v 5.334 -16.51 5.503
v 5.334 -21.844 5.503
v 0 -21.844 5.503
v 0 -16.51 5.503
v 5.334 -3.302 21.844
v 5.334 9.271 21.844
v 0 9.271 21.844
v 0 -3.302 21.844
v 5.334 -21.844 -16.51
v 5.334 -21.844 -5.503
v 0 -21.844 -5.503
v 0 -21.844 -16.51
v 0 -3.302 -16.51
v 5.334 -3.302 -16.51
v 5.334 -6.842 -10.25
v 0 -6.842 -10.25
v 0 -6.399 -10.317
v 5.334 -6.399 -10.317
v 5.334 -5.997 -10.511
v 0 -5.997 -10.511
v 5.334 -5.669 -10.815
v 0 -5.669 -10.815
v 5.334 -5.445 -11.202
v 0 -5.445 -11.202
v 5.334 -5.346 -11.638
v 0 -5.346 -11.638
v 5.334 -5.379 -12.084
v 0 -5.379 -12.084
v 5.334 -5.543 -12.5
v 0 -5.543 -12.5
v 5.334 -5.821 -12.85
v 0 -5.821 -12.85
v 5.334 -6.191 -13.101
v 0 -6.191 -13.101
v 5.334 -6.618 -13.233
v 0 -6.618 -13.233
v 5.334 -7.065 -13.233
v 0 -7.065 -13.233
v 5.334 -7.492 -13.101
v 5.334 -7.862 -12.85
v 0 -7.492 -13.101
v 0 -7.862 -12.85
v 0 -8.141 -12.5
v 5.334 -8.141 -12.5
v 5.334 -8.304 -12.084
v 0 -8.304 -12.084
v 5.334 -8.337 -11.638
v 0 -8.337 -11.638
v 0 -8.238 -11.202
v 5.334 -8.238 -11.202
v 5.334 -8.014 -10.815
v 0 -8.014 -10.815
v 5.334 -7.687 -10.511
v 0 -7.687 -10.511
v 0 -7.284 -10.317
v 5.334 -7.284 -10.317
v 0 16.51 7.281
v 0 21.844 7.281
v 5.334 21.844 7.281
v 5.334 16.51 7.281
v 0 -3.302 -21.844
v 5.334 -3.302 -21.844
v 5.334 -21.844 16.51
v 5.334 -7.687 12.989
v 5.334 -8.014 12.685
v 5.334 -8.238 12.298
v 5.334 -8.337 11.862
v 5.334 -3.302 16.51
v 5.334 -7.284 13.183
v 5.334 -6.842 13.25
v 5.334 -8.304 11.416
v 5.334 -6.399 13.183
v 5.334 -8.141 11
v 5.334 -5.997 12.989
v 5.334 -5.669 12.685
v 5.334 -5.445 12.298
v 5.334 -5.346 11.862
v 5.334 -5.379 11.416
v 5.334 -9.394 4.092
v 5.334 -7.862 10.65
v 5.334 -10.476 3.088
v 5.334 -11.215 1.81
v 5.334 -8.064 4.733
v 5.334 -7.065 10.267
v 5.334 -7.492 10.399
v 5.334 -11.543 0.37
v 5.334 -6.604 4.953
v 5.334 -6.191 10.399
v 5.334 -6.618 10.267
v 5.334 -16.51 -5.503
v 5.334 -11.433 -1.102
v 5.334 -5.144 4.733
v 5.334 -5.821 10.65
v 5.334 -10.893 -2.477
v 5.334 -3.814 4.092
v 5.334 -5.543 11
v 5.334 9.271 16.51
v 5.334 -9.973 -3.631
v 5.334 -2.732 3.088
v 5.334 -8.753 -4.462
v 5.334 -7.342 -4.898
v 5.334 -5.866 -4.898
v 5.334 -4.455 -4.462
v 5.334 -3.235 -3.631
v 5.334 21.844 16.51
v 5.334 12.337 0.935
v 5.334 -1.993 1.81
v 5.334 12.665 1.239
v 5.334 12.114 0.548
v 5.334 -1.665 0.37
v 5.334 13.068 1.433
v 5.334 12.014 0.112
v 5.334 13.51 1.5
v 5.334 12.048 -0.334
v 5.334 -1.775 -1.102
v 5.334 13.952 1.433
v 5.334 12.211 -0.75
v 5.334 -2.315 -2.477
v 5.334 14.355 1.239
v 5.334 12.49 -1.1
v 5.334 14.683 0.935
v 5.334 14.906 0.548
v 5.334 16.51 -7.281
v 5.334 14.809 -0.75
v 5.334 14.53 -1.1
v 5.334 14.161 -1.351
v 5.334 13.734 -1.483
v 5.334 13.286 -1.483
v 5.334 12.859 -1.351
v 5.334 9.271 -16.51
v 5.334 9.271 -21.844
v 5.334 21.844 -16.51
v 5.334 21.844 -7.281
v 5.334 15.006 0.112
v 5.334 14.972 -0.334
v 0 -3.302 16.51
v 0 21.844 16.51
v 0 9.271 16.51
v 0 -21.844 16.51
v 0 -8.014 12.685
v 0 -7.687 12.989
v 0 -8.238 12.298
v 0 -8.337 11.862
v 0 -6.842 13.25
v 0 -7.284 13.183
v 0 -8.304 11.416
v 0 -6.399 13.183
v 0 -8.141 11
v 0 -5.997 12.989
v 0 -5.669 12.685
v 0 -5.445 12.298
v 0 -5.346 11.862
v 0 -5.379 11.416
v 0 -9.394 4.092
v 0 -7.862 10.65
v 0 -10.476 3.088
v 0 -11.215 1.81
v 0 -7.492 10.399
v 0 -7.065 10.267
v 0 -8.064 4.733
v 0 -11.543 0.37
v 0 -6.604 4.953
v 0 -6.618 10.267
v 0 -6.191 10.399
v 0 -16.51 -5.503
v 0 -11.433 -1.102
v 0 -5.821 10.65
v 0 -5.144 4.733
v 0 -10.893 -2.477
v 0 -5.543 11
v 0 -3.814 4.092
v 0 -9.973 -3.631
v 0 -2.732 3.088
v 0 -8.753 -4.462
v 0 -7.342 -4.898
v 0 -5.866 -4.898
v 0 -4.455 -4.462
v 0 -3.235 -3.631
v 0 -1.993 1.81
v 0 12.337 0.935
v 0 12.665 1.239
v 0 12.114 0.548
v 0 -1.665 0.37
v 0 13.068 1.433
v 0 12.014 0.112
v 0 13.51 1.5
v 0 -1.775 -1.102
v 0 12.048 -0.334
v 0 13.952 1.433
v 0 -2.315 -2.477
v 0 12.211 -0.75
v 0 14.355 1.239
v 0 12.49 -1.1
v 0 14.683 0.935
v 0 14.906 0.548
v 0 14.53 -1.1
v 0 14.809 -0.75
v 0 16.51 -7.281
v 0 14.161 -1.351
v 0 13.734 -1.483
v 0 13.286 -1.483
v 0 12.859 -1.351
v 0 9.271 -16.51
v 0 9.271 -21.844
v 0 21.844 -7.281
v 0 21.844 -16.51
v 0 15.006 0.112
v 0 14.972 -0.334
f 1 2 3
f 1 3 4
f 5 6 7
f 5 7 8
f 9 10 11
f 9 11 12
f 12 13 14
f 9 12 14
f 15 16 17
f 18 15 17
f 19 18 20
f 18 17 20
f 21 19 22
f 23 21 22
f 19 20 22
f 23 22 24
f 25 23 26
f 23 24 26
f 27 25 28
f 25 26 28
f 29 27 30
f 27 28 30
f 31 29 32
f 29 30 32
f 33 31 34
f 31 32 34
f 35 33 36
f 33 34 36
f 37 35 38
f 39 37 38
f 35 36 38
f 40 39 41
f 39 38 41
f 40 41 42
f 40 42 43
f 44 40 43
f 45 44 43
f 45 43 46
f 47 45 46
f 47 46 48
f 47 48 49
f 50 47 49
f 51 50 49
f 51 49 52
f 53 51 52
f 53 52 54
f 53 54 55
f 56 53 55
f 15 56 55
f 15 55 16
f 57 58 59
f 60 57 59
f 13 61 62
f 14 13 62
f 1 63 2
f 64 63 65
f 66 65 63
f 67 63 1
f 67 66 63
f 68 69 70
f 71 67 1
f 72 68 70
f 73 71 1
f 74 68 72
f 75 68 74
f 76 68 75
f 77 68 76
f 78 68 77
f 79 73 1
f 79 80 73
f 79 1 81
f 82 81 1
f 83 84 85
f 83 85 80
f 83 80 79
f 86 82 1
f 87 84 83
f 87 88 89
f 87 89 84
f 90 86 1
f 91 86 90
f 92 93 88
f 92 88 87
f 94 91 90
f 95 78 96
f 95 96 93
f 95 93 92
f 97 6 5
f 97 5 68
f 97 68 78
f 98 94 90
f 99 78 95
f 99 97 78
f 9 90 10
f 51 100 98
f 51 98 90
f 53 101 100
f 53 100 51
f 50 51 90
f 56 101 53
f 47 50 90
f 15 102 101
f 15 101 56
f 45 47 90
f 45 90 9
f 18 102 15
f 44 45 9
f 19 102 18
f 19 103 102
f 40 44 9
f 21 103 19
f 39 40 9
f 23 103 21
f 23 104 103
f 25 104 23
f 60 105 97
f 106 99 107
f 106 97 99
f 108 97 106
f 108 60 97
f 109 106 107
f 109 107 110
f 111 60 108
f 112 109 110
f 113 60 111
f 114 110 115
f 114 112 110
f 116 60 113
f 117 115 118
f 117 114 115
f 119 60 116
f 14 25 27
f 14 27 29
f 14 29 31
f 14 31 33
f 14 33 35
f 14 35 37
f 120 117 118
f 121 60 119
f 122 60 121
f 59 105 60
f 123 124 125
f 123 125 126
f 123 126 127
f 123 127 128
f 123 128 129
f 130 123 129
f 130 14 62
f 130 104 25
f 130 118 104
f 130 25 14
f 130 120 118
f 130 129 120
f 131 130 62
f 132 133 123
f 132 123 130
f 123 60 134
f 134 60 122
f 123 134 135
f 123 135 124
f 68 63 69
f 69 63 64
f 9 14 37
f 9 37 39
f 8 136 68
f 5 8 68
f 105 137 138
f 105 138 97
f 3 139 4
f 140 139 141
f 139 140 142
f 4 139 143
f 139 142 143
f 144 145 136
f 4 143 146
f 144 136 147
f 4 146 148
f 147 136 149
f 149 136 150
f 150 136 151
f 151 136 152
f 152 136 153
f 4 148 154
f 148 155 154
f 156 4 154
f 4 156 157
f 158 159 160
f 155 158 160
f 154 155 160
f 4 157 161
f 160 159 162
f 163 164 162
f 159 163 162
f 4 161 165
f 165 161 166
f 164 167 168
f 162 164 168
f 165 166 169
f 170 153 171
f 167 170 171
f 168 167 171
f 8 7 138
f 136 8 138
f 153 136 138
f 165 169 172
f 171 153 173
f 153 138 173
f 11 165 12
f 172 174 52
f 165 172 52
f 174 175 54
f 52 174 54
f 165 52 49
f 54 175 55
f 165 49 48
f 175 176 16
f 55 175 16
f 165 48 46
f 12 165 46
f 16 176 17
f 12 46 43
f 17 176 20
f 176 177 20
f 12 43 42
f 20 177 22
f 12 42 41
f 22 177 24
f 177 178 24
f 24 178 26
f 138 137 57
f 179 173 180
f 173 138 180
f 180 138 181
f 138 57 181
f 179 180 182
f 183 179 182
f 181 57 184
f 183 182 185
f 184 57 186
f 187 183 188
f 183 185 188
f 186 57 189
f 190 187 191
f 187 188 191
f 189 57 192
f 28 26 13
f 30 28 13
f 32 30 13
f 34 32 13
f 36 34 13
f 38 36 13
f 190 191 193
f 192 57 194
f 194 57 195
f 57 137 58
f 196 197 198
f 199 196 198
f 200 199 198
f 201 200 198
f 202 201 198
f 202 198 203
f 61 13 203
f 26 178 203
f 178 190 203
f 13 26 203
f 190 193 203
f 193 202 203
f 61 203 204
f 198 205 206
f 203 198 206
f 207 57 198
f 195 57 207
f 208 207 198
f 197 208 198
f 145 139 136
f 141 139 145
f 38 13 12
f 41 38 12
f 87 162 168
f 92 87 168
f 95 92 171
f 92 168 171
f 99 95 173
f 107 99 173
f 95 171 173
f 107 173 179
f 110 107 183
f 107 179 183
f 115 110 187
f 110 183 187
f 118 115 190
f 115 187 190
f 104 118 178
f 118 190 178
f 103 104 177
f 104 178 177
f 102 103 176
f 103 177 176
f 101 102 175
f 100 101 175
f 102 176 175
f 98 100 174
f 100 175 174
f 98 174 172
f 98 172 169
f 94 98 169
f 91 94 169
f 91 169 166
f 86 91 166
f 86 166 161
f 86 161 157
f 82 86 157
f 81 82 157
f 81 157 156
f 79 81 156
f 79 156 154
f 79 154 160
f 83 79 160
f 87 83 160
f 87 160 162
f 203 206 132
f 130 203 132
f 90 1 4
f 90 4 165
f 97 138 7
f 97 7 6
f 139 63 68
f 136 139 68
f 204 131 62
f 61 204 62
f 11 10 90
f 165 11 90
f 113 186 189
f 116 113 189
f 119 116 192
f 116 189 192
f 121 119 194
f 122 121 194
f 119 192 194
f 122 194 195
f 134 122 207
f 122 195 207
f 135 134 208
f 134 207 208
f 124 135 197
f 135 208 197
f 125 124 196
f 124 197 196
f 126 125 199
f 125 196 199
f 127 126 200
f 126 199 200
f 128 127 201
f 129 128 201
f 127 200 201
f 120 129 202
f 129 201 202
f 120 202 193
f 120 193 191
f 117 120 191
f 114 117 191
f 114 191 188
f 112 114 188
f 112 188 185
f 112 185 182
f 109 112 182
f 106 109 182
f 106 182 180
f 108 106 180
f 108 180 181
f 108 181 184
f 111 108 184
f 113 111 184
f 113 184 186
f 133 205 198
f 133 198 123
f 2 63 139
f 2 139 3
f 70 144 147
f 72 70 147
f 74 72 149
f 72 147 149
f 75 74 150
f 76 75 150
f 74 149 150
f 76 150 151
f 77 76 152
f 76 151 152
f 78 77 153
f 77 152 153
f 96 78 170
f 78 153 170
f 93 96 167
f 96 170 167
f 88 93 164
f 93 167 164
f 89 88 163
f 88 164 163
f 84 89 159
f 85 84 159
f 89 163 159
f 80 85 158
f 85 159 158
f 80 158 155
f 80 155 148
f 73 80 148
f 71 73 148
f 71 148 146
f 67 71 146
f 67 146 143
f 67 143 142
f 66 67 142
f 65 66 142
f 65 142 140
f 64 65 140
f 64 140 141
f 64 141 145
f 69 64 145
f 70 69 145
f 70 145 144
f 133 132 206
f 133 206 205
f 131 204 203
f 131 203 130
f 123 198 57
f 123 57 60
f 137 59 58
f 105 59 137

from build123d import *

# Parameters (mm, degrees)
SKETCH2_W             = 33.02
SKETCH2_H             = 33.02
BOSS_EXTRUDE2_DEPTH   = 5.334
SKETCH3_W             = 33.02
SKETCH3_H             = 5.334
BOSS_EXTRUDE6_DEPTH   = 5.334
SKETCH6_W             = 11.006666666
SKETCH6_H             = 5.334
CUT_EXTRUDE2_DEPTH    = 32.349198203
CAVITY2_START         = -21.844
CAVITY2_OUTLINE_W     = 5.334
CAVITY2_OUTLINE_H     = 13.208
CAVITY2_OUTLINE_H_2   = 12.573
CAVITY2_DEPTH         = 5.334
CAVITY2_START_2       = 16.51
CAVITY2_2_OUTLINE_W   = 5.334
CAVITY2_2_OUTLINE_H   = 13.208
CAVITY2_2_OUTLINE_H_2 = 12.573
CAVITY2_2_DEPTH       = 5.334
CAVITY2_START_3       = -7.281333333
CAVITY2_3_OUTLINE_W   = 5.334
CAVITY2_3_OUTLINE_H   = 5.334
CAVITY2_3_DEPTH       = 14.562666666
SKETCH7_R             = 1.5
SKETCH7_R_2           = 4.953
CUT_EXTRUDE3_DEPTH    = 32.349198203


# Read off the part's stored shape, not the designer's step: Cavity2
with BuildPart() as part:
    # Sketch2 → Boss-Extrude2 (new body)
    with BuildSketch(Plane(origin=(0, 0, 0), x_dir=(0, 0, -1), z_dir=(1, 0, 0))):
        Rectangle(SKETCH2_W, SKETCH2_H)
    extrude(amount=BOSS_EXTRUDE2_DEPTH)

    # Sketch3 → Boss-Extrude6 (add, through all)
    with BuildSketch(Plane(origin=(5.334, 0, 0), x_dir=(0, 0, -1), z_dir=(1, 0, 0))):
        Polygon((-16.51, 16.51), (-16.51, 21.844), (-21.844, 21.844), (-21.844, -16.51), (-16.51, -16.51), align=None)
        with Locations((0, 19.177)):
            Rectangle(SKETCH3_W, SKETCH3_H)
        Polygon((21.844, 21.844), (21.844, -16.51), (16.51, -16.51), (16.51, 16.51), (16.51, 21.844), align=None)
        with Locations((0, -19.177)):
            Rectangle(SKETCH3_W, SKETCH3_H)
    extrude(amount=-BOSS_EXTRUDE6_DEPTH)

    # Sketch6 → Cut-Extrude2 (cut, through all)
    with BuildSketch(Plane(origin=(5.334, 0, 0), x_dir=(0, 0, -1), z_dir=(1, 0, 0))):
        with Locations((0, -19.177)):
            Rectangle(SKETCH6_W, SKETCH6_H)
    extrude(amount=-CUT_EXTRUDE2_DEPTH, mode=Mode.SUBTRACT)

    # Cavity2 outline → Cavity2 (cut)
    with BuildSketch(Plane.XY.offset(CAVITY2_START)):
        with Locations((2.667, -9.906)):
            Rectangle(CAVITY2_OUTLINE_W, CAVITY2_OUTLINE_H)
        with Locations((2.667, 15.5575)):
            Rectangle(CAVITY2_OUTLINE_W, CAVITY2_OUTLINE_H_2)
    extrude(amount=CAVITY2_DEPTH, mode=Mode.SUBTRACT)

    # Cavity2 2 outline → Cavity2 2 (cut)
    with BuildSketch(Plane.XY.offset(CAVITY2_START_2)):
        with Locations((2.667, -9.906)):
            Rectangle(CAVITY2_2_OUTLINE_W, CAVITY2_2_OUTLINE_H)
        with Locations((2.667, 15.5575)):
            Rectangle(CAVITY2_2_OUTLINE_W, CAVITY2_2_OUTLINE_H_2)
    extrude(amount=CAVITY2_2_DEPTH, mode=Mode.SUBTRACT)

    # Cavity2 3 outline → Cavity2 3 (cut)
    with BuildSketch(Plane.XY.offset(CAVITY2_START_3)):
        with Locations((2.667, 19.177)):
            Rectangle(CAVITY2_3_OUTLINE_W, CAVITY2_3_OUTLINE_H)
    extrude(amount=CAVITY2_3_DEPTH, mode=Mode.SUBTRACT)

    # Sketch7 → Cut-Extrude3 (cut, through all)
    with BuildSketch(Plane.ZY):
        with Locations((0, 13.51)):
            Circle(SKETCH7_R)
        with Locations((11.75, -6.841596989)):
            Circle(SKETCH7_R)
        with Locations((0, -6.604)):
            Circle(SKETCH7_R_2)
        with Locations((-11.75, -6.841596989)):
            Circle(SKETCH7_R)
    extrude(amount=-CUT_EXTRUDE3_DEPTH, mode=Mode.SUBTRACT)


solid = part.part
